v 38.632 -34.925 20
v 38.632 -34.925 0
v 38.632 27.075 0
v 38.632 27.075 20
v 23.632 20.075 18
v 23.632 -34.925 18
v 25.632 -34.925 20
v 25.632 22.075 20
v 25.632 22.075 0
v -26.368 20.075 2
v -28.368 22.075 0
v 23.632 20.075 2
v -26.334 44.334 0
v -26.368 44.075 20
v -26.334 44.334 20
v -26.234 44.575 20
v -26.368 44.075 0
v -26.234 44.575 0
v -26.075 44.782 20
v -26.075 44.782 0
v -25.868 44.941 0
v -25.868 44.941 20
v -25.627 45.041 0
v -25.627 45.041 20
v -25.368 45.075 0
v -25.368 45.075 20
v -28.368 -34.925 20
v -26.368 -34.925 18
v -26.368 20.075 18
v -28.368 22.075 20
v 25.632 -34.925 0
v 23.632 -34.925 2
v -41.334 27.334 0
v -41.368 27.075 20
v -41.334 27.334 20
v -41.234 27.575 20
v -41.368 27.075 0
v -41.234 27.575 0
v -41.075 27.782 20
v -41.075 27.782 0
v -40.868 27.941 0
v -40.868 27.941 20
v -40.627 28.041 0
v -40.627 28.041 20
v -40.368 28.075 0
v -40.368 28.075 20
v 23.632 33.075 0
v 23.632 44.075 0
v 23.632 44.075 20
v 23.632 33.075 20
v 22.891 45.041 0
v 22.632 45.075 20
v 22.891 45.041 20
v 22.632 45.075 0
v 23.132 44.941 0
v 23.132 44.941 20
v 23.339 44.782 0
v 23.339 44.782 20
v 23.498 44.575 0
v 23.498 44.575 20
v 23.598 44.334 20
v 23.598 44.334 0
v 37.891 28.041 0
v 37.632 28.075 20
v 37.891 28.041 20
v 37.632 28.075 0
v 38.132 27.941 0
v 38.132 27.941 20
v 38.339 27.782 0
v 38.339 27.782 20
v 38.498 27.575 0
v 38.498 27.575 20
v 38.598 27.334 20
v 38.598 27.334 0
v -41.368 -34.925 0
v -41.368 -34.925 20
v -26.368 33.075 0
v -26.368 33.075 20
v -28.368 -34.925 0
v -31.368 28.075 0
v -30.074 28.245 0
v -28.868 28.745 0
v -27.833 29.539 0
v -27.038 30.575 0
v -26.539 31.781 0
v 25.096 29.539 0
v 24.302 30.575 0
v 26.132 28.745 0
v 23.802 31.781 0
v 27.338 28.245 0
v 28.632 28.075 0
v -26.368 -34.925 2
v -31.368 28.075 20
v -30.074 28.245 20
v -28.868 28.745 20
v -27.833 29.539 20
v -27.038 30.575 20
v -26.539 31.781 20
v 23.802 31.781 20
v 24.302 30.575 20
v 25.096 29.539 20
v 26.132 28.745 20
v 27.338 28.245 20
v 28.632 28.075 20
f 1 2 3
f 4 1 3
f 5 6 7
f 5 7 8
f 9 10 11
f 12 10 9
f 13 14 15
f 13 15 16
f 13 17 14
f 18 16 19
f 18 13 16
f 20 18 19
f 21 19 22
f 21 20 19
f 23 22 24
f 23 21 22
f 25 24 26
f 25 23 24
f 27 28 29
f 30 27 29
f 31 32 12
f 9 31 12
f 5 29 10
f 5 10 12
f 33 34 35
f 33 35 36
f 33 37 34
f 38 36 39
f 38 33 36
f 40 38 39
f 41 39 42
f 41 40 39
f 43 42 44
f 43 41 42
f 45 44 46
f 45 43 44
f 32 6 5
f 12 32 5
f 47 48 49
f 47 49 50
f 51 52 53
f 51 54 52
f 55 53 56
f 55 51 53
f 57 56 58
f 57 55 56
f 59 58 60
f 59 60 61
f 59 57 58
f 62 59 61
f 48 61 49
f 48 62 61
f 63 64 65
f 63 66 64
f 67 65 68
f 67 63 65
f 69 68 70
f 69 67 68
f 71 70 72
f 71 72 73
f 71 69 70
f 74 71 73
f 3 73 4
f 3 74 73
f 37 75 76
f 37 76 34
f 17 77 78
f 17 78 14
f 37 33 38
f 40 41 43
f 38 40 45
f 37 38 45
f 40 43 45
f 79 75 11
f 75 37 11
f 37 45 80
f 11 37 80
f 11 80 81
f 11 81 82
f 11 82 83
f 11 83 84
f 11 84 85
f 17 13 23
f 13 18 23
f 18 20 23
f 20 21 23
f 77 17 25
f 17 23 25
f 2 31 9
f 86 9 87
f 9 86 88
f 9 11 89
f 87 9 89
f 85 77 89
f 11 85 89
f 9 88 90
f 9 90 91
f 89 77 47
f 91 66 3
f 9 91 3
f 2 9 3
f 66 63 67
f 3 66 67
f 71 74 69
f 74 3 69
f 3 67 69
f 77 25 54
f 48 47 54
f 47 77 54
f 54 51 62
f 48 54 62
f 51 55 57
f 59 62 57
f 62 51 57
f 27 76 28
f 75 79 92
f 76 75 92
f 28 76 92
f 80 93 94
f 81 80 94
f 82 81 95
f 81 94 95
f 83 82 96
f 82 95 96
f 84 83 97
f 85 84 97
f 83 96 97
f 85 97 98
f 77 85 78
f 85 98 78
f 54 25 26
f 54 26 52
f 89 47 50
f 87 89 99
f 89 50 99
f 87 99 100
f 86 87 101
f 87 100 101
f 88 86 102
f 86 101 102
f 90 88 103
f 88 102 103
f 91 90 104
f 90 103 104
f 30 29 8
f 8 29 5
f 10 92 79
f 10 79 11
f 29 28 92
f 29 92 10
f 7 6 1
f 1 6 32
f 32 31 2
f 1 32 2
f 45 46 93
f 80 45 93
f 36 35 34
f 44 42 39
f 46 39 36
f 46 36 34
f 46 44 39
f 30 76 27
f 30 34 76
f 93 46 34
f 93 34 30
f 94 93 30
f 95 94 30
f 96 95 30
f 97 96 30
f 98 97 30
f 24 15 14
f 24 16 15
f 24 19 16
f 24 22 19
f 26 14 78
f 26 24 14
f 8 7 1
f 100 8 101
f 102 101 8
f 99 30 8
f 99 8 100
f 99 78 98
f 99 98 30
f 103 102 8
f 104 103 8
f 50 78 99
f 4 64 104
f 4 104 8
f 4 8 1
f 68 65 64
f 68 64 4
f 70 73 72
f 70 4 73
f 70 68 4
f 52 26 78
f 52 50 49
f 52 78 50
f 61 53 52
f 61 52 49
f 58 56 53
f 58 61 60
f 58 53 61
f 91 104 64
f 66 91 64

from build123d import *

# Parameters (mm, degrees)
SKETCH_W        = 80
SKETCH_H        = 80
PAD_DEPTH       = 20
SKETCH001_W     = 50
SKETCH001_H     = 55
POCKET_DEPTH    = 20
POCKET001_DEPTH = 20
FILLET_R        = 1
CHAMFER_SIZE    = 2


with BuildPart() as part:
    # Sketch → Pad (new body)
    with BuildSketch(Plane.XY):
        with Locations((-1.368219, 5.07491)):
            Rectangle(SKETCH_W, SKETCH_H)
    extrude(amount=PAD_DEPTH)

    # Sketch001 (on Face6 of Pad) → Pocket (cut)
    with BuildSketch(Plane.XY.offset(20)):
        with Locations((-1.368219, -7.42509)):
            Rectangle(SKETCH001_W, SKETCH001_H)
    extrude(amount=-POCKET_DEPTH, mode=Mode.SUBTRACT)

    # Sketch002 (on Face5 of Pocket) → Pocket001 (cut)
    with BuildSketch(Plane.XY.offset(20)):
        with BuildLine():
            Line((-41.368219, 45.07491), (-41.368219, 28.07491))
            Line((-41.368219, 28.07491), (-31.368219, 28.07491))
            ThreePointArc((-31.368219, 28.07491), (-27.832685, 29.539376), (-26.368219, 33.07491))
            Line((-26.368219, 33.07491), (-26.368219, 45.07491))
            Line((-26.368219, 45.07491), (-41.368219, 45.07491))
        make_face()
        with BuildLine():
            Line((38.631781, 45.07491), (23.631781, 45.07491))
            Line((23.631781, 45.07491), (23.631781, 33.07491))
            ThreePointArc((23.631781, 33.07491), (25.096247, 29.539376), (28.631781, 28.07491))
            Line((28.631781, 28.07491), (38.631781, 28.07491))
            Line((38.631781, 28.07491), (38.631781, 45.07491))
        make_face()
    extrude(amount=-POCKET001_DEPTH, mode=Mode.SUBTRACT)

    # Fillet
    fillet_edges = [part.edges().sort_by_distance(p)[0] for p in [
        (-26.368219, 45.07491, 10),
        (-41.368219, 28.07491, 10),
        (38.631781, 28.07491, 10),
        (23.631781, 45.07491, 10),
    ]]
    fillet(fillet_edges, radius=FILLET_R)

    # Chamfer
    chamfer_edges = [part.edges().sort_by_distance(p)[0] for p in [
        (-26.368219, -7.42509, 20),
        (-1.368219, 20.07491, 20),
        (23.631781, -7.42509, 20),
        (-26.368219, -7.42509, 0),
        (-1.368219, 20.07491, 0),
        (23.631781, -7.42509, 0),
    ]]
    chamfer(chamfer_edges, length=CHAMFER_SIZE)


solid = part.part
